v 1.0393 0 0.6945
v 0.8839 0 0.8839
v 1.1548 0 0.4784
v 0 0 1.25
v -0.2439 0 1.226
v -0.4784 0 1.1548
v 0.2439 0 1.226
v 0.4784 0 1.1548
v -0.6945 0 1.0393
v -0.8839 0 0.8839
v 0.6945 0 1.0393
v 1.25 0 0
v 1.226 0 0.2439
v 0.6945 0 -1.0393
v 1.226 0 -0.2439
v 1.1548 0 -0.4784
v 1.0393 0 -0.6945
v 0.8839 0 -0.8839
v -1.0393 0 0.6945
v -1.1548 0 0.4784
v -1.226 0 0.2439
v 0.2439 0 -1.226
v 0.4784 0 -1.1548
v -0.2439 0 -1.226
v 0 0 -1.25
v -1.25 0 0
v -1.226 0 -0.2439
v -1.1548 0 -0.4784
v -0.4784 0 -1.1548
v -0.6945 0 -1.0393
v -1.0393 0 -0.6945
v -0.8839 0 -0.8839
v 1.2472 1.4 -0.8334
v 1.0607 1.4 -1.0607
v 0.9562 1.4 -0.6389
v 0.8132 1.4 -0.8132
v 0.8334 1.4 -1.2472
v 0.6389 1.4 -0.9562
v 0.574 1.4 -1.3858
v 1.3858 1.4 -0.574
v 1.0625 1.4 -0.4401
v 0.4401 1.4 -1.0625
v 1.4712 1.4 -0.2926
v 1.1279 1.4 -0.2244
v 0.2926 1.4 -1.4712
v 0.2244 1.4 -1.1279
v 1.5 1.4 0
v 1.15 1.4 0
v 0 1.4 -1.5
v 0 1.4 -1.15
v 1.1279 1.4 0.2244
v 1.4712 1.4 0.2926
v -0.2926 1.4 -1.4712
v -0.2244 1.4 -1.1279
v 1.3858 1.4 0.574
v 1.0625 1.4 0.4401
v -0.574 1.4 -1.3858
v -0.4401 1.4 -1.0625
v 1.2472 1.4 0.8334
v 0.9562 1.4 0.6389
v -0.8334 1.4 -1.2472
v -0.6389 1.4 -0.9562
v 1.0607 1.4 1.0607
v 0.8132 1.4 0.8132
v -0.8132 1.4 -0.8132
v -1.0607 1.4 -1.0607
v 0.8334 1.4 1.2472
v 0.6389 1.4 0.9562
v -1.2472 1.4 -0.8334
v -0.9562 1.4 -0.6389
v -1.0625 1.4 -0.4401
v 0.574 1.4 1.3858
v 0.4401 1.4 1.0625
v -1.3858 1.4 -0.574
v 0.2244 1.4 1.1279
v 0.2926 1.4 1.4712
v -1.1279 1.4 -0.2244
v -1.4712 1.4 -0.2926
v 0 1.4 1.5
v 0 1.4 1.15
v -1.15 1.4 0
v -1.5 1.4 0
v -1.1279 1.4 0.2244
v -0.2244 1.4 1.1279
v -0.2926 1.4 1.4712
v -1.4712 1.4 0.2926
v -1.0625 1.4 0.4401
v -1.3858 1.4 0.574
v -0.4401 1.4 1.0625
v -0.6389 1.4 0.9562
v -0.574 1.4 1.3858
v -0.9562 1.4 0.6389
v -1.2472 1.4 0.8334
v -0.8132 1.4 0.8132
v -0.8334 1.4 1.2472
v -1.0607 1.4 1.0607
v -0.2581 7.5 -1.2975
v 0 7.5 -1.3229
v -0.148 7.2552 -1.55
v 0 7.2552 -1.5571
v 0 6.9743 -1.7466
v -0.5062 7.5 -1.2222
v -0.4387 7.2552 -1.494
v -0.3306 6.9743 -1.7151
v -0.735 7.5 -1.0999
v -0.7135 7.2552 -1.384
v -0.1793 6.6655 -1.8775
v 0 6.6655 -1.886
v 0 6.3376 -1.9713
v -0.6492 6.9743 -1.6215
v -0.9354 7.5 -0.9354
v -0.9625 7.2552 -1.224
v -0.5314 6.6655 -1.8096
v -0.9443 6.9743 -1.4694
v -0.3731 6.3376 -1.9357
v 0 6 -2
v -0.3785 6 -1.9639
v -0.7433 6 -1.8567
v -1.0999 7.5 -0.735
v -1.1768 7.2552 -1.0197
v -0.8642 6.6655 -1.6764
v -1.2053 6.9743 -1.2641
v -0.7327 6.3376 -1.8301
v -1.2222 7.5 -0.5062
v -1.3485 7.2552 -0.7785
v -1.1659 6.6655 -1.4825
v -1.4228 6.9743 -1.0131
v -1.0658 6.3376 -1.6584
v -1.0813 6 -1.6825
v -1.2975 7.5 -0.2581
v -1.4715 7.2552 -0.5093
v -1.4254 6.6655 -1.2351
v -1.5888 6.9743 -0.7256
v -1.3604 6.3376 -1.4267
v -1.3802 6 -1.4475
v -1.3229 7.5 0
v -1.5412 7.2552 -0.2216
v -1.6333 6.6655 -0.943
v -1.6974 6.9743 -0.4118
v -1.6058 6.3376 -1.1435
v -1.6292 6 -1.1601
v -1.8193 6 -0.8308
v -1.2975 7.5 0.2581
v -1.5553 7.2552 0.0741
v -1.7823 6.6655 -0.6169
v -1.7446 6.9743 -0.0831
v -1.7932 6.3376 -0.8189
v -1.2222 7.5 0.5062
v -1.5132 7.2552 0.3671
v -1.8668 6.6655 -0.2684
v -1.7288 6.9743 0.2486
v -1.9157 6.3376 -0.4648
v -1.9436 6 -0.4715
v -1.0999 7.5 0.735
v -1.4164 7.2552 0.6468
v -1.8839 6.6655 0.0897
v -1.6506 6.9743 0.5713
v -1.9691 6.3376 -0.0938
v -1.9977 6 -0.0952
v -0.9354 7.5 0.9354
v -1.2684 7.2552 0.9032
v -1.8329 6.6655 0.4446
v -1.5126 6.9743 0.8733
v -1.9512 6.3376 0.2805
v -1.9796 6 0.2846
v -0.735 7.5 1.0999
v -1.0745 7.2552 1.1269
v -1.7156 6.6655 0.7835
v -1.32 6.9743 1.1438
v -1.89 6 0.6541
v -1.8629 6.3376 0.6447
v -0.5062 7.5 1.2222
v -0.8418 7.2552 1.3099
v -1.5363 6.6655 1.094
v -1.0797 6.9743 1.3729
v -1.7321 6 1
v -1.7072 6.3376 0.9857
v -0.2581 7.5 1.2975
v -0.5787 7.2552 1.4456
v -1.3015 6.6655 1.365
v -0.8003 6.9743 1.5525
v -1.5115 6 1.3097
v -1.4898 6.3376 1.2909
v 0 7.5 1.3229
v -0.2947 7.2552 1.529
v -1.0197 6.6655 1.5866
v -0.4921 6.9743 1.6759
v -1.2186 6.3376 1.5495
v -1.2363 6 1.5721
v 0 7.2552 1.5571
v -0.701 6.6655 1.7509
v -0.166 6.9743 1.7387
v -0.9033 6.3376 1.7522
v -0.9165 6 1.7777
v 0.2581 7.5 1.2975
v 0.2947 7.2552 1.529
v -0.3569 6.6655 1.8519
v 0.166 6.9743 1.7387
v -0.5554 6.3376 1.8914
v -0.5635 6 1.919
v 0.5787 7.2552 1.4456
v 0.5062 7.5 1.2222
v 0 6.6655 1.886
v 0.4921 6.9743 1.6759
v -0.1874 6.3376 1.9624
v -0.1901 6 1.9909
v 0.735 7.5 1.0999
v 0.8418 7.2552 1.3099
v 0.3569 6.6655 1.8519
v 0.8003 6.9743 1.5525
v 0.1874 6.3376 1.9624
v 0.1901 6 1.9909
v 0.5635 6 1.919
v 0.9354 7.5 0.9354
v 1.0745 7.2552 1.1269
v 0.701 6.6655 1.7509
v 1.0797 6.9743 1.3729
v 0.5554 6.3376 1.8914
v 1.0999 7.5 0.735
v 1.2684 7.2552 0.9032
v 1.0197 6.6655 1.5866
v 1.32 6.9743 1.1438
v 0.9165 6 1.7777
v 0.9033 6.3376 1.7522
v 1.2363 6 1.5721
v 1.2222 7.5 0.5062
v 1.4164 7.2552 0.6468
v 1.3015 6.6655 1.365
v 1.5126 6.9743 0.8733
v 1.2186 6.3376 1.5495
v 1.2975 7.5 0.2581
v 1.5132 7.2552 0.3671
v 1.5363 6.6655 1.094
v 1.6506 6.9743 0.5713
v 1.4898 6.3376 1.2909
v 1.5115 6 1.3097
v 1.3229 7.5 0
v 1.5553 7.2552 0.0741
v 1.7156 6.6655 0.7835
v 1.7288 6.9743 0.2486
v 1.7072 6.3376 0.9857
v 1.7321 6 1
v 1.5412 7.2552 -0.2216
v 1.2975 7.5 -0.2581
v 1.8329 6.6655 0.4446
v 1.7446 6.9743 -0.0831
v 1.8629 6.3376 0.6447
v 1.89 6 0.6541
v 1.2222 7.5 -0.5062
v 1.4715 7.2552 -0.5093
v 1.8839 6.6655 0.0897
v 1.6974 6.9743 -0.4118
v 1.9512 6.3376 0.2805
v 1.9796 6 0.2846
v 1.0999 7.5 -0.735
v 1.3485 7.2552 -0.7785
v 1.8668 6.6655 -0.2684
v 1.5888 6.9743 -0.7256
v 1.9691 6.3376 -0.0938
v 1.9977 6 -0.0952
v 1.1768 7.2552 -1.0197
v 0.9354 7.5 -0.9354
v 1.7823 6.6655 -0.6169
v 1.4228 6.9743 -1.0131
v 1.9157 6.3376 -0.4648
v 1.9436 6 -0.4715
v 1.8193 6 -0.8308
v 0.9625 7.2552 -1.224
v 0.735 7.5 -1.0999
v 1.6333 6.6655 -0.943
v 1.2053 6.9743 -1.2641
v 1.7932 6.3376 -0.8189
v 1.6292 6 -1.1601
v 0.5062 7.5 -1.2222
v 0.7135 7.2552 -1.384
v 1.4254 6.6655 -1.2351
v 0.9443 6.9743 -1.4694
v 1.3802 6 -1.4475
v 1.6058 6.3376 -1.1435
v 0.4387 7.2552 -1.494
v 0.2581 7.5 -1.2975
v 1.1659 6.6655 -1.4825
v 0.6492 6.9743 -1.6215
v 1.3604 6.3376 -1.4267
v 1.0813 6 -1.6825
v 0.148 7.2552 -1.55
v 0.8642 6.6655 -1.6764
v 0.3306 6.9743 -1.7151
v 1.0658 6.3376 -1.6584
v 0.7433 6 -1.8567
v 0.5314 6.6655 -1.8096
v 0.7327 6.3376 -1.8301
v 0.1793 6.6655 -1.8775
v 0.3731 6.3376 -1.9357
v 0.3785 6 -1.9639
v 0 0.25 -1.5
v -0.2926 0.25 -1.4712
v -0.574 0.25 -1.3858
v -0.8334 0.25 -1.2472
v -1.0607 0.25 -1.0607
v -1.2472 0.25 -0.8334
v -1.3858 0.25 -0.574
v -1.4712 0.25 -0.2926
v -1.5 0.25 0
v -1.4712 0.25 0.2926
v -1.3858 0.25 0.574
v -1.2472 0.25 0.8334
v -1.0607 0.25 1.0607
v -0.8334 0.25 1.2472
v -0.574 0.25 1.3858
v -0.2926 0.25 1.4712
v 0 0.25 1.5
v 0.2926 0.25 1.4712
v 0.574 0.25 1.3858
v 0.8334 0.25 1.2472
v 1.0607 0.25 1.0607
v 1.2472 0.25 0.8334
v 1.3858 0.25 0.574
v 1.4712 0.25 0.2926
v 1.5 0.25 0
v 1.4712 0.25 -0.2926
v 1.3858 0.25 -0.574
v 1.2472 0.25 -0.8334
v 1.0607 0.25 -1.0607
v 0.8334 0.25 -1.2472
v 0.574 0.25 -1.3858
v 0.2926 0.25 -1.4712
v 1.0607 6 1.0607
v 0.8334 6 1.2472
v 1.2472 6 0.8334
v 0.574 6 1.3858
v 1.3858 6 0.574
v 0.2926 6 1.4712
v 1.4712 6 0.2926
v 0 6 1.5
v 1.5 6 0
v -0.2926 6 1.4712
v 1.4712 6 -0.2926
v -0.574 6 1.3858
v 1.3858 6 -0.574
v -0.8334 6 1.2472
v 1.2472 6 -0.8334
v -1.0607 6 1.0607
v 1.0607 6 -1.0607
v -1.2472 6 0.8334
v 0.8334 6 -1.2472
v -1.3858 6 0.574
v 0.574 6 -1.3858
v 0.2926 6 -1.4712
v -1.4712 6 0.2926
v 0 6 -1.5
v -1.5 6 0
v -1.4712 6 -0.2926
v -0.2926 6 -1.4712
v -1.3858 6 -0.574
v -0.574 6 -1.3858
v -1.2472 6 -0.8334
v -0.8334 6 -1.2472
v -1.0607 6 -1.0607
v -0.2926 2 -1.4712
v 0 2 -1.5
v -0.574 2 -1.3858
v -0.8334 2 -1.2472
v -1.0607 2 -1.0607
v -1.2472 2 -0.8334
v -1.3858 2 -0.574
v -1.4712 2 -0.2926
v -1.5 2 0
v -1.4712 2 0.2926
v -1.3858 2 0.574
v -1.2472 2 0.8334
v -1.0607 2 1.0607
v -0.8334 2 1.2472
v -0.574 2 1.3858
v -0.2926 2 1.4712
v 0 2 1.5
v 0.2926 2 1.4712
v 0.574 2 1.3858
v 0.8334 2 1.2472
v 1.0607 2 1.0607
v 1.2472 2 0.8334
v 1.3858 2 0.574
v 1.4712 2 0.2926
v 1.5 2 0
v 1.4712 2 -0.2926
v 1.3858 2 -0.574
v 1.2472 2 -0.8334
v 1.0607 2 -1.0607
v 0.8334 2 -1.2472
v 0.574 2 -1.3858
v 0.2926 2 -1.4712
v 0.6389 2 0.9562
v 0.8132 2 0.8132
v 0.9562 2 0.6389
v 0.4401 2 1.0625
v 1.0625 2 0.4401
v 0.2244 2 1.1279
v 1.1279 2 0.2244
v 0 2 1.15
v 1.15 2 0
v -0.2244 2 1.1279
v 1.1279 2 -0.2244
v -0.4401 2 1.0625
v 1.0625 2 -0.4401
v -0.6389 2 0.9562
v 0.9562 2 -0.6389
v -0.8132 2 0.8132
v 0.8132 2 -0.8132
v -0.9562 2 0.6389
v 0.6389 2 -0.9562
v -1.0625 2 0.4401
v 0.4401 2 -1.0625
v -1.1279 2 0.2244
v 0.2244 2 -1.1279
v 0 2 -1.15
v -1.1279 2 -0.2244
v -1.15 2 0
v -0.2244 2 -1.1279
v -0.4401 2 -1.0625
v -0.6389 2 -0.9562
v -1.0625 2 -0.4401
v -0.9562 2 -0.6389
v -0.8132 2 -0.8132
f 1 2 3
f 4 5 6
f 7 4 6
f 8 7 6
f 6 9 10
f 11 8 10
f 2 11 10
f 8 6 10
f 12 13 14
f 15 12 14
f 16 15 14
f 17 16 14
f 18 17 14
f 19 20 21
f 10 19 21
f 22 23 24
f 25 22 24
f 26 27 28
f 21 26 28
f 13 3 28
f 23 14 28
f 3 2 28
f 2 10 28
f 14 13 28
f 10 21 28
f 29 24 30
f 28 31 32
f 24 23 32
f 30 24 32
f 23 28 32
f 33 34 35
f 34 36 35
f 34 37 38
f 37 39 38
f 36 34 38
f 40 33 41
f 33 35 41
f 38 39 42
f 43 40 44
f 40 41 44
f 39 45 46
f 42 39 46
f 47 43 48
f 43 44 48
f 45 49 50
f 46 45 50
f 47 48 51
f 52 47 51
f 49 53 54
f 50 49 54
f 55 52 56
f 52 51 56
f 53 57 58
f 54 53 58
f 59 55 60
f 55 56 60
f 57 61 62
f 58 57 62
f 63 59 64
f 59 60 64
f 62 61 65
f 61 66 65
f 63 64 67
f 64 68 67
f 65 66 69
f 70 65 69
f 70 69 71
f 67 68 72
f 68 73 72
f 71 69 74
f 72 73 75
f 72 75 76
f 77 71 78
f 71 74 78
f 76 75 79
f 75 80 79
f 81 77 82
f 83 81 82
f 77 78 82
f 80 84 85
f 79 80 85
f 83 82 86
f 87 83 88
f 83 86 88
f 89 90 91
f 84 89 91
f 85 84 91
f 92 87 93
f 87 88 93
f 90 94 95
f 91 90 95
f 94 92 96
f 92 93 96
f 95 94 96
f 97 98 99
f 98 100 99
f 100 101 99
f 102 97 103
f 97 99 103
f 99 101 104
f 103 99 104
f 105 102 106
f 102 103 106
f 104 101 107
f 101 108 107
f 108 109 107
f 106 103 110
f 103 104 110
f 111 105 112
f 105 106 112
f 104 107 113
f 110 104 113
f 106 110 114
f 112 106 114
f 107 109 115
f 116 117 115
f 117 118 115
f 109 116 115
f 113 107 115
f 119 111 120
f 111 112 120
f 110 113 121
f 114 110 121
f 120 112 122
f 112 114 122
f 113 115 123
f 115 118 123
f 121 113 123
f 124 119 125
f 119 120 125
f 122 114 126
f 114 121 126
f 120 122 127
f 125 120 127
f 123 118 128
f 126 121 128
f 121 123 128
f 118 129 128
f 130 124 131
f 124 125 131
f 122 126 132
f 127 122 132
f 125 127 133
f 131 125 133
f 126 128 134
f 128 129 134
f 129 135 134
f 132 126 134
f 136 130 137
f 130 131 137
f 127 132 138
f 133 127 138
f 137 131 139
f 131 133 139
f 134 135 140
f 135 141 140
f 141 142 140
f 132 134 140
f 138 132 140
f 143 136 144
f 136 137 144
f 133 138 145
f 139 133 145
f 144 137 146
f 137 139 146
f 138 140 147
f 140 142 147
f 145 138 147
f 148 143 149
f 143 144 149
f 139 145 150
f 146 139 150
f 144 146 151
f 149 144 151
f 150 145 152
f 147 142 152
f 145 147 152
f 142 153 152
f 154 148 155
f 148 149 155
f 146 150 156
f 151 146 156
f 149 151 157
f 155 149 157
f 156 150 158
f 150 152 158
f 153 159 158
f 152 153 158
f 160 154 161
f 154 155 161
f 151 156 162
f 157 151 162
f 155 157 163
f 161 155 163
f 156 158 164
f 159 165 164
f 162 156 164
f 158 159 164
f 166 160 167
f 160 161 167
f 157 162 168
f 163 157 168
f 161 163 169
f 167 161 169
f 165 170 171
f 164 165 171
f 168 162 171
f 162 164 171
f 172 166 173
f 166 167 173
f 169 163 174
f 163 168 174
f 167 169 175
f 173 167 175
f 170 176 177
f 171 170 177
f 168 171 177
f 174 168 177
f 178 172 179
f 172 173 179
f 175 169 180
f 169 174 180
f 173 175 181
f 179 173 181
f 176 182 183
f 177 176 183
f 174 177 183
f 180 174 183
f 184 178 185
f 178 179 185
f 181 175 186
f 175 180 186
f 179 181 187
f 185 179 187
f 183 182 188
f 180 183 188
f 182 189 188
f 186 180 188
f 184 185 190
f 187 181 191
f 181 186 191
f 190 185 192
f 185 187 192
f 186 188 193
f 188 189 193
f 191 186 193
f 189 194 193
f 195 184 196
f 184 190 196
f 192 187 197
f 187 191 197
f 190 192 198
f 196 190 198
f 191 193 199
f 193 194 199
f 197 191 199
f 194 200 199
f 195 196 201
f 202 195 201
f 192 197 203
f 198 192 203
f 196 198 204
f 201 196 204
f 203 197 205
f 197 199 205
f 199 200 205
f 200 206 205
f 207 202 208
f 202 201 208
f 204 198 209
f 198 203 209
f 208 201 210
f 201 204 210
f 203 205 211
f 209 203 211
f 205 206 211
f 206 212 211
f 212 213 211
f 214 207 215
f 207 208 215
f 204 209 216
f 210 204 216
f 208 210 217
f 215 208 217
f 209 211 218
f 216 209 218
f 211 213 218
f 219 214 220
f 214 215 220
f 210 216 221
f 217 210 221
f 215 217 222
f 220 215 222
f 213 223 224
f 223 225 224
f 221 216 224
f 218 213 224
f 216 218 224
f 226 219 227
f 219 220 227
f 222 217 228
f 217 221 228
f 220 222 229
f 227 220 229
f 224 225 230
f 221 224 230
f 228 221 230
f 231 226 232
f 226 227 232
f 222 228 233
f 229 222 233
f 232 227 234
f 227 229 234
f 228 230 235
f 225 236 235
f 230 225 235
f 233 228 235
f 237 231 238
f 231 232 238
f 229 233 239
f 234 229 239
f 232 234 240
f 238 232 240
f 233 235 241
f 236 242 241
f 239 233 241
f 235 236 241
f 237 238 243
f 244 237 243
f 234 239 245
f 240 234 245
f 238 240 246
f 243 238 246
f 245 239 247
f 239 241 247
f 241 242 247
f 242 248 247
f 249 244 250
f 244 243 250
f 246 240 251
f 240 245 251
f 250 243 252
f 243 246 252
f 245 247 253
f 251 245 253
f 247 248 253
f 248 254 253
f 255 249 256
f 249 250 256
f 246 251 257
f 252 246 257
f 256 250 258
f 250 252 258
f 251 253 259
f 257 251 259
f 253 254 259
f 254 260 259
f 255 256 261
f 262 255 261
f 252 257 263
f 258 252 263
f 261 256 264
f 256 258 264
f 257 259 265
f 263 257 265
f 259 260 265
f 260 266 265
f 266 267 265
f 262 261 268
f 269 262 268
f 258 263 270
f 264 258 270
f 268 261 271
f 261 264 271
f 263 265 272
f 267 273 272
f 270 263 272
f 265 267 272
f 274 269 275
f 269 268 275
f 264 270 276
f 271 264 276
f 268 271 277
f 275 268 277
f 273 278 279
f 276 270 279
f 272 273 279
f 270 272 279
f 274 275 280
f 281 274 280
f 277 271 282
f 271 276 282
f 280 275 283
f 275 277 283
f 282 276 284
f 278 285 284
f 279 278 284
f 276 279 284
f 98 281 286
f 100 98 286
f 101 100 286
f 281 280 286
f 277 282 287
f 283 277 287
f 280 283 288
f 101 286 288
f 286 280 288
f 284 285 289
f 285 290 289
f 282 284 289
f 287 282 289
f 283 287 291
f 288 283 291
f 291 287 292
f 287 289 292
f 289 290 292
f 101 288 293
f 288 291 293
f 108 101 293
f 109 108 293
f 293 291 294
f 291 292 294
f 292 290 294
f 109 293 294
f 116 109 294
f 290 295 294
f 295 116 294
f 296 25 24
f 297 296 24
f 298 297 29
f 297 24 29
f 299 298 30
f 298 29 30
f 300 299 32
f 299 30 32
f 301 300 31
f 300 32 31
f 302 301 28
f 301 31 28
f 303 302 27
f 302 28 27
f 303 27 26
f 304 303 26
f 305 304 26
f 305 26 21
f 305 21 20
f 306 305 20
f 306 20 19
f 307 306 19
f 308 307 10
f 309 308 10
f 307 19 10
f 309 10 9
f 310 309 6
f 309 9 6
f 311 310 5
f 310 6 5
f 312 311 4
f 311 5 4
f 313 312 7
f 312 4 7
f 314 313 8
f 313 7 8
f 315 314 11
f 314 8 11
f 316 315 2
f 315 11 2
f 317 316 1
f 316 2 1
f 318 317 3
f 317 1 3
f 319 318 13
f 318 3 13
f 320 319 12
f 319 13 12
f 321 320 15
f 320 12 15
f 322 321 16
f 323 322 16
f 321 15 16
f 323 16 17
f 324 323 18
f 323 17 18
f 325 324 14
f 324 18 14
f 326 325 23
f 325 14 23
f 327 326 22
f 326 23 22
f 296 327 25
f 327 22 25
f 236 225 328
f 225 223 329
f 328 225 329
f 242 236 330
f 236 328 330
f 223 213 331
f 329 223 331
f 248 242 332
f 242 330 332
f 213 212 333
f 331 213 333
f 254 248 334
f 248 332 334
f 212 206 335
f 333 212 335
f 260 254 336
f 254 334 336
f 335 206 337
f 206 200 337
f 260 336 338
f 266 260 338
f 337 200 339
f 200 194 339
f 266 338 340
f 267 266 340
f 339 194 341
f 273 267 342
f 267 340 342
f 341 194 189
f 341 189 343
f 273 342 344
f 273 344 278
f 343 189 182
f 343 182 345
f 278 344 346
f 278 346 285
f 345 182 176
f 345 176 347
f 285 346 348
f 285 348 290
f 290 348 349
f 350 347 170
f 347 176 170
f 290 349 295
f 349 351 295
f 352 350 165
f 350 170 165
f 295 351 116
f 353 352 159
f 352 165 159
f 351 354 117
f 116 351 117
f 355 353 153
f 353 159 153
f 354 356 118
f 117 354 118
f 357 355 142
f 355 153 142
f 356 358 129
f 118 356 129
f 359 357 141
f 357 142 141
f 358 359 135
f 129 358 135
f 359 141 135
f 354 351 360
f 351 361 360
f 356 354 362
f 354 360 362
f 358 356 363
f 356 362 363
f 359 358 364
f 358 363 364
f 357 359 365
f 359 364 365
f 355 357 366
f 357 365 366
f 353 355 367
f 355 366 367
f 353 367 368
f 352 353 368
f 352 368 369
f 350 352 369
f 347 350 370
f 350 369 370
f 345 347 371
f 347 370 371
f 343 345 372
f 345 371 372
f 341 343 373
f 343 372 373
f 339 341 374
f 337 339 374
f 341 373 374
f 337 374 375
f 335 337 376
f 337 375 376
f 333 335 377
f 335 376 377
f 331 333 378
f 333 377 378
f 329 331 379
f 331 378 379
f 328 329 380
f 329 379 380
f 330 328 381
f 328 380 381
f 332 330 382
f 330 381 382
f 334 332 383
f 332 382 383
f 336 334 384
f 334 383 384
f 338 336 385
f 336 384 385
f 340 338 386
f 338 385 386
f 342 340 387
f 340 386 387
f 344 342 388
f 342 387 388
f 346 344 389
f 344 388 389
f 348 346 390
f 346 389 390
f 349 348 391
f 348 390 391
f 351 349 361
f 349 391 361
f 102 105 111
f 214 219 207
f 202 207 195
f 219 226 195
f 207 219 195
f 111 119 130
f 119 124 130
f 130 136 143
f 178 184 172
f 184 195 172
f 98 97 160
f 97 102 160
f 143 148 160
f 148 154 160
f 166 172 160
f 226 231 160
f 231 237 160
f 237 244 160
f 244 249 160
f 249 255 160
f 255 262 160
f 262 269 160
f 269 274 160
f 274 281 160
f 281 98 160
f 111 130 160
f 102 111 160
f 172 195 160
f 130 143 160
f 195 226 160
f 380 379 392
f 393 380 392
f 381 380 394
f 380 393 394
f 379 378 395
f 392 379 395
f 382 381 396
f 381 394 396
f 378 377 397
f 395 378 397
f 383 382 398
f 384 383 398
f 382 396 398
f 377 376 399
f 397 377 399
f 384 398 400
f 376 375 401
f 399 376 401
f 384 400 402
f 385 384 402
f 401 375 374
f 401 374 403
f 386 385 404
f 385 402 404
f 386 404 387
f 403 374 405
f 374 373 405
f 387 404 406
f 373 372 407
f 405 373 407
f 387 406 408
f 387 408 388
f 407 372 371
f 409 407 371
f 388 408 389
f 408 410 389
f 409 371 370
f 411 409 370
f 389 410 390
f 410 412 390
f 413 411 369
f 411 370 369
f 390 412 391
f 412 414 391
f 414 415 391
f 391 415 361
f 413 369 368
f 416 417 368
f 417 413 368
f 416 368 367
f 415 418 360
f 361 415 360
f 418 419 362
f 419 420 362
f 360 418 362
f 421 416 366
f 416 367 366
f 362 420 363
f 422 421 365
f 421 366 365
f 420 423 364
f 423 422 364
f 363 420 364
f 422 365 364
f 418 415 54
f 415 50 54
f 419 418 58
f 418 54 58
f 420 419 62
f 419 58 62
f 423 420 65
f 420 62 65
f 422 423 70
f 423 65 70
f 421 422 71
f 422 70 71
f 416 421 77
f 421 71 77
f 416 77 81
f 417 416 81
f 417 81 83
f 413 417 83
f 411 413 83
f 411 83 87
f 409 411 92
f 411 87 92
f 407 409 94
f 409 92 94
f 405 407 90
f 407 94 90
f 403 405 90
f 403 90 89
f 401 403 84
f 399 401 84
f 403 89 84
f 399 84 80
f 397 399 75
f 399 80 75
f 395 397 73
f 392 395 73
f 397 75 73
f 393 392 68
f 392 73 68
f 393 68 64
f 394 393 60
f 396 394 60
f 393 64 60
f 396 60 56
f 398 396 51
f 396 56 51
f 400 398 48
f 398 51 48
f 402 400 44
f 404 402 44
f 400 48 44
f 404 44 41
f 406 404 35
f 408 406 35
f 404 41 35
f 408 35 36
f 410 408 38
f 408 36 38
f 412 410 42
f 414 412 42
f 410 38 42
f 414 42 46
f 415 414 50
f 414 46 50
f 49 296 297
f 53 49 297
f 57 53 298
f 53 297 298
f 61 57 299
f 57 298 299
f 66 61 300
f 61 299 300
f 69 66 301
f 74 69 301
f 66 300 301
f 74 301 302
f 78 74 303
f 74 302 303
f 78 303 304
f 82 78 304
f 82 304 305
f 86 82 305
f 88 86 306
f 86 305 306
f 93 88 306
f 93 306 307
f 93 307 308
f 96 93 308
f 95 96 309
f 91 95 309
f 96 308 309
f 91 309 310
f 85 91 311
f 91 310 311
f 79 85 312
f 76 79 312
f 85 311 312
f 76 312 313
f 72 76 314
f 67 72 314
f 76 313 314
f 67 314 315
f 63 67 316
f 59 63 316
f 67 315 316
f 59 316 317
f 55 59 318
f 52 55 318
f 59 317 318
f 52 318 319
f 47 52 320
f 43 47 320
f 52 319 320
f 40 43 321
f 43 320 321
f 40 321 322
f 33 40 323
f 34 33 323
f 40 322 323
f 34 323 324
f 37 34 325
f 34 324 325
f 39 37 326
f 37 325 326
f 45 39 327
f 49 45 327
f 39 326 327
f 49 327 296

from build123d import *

# Parameters (mm, degrees)
CHAMFER1_SIZE = 0.25


with BuildPart() as part:
    # Sketch1 → Revolve2 (revolve)
    with BuildSketch(Plane.XY, mode=Mode.PRIVATE) as revolve2_sk:
        with BuildLine():
            Line((0, 0), (0, 6))
            Line((0, 6), (0, 7.5))
            Line((0, 7.5), (1.322875656, 7.5))
            ThreePointArc((1.322875656, 7.5), (1.822875656, 6.822875656), (2, 6))
            Line((2, 6), (1.5, 6))
            Line((1.5, 6), (1.5, 2))
            Line((1.5, 2), (1.15, 2))
            Line((1.15, 2), (1.15, 1.4))
            Line((1.15, 1.4), (1.5, 1.4))
            Line((1.5, 1.4), (1.5, 0))
            Line((1.5, 0), (0, 0))
        make_face()
    revolve(revolve2_sk.sketch.rotate(Axis((0, 0, 0), (0, 1, 0)), 90), axis=Axis((0, 0, 0), (0, 1, 0)))

    # Chamfer1
    chamfer1_edges = [part.edges().sort_by_distance(p)[0] for p in [
        (0, 0, 1.5),
    ]]
    chamfer(chamfer1_edges, length=CHAMFER1_SIZE)


solid = part.part
